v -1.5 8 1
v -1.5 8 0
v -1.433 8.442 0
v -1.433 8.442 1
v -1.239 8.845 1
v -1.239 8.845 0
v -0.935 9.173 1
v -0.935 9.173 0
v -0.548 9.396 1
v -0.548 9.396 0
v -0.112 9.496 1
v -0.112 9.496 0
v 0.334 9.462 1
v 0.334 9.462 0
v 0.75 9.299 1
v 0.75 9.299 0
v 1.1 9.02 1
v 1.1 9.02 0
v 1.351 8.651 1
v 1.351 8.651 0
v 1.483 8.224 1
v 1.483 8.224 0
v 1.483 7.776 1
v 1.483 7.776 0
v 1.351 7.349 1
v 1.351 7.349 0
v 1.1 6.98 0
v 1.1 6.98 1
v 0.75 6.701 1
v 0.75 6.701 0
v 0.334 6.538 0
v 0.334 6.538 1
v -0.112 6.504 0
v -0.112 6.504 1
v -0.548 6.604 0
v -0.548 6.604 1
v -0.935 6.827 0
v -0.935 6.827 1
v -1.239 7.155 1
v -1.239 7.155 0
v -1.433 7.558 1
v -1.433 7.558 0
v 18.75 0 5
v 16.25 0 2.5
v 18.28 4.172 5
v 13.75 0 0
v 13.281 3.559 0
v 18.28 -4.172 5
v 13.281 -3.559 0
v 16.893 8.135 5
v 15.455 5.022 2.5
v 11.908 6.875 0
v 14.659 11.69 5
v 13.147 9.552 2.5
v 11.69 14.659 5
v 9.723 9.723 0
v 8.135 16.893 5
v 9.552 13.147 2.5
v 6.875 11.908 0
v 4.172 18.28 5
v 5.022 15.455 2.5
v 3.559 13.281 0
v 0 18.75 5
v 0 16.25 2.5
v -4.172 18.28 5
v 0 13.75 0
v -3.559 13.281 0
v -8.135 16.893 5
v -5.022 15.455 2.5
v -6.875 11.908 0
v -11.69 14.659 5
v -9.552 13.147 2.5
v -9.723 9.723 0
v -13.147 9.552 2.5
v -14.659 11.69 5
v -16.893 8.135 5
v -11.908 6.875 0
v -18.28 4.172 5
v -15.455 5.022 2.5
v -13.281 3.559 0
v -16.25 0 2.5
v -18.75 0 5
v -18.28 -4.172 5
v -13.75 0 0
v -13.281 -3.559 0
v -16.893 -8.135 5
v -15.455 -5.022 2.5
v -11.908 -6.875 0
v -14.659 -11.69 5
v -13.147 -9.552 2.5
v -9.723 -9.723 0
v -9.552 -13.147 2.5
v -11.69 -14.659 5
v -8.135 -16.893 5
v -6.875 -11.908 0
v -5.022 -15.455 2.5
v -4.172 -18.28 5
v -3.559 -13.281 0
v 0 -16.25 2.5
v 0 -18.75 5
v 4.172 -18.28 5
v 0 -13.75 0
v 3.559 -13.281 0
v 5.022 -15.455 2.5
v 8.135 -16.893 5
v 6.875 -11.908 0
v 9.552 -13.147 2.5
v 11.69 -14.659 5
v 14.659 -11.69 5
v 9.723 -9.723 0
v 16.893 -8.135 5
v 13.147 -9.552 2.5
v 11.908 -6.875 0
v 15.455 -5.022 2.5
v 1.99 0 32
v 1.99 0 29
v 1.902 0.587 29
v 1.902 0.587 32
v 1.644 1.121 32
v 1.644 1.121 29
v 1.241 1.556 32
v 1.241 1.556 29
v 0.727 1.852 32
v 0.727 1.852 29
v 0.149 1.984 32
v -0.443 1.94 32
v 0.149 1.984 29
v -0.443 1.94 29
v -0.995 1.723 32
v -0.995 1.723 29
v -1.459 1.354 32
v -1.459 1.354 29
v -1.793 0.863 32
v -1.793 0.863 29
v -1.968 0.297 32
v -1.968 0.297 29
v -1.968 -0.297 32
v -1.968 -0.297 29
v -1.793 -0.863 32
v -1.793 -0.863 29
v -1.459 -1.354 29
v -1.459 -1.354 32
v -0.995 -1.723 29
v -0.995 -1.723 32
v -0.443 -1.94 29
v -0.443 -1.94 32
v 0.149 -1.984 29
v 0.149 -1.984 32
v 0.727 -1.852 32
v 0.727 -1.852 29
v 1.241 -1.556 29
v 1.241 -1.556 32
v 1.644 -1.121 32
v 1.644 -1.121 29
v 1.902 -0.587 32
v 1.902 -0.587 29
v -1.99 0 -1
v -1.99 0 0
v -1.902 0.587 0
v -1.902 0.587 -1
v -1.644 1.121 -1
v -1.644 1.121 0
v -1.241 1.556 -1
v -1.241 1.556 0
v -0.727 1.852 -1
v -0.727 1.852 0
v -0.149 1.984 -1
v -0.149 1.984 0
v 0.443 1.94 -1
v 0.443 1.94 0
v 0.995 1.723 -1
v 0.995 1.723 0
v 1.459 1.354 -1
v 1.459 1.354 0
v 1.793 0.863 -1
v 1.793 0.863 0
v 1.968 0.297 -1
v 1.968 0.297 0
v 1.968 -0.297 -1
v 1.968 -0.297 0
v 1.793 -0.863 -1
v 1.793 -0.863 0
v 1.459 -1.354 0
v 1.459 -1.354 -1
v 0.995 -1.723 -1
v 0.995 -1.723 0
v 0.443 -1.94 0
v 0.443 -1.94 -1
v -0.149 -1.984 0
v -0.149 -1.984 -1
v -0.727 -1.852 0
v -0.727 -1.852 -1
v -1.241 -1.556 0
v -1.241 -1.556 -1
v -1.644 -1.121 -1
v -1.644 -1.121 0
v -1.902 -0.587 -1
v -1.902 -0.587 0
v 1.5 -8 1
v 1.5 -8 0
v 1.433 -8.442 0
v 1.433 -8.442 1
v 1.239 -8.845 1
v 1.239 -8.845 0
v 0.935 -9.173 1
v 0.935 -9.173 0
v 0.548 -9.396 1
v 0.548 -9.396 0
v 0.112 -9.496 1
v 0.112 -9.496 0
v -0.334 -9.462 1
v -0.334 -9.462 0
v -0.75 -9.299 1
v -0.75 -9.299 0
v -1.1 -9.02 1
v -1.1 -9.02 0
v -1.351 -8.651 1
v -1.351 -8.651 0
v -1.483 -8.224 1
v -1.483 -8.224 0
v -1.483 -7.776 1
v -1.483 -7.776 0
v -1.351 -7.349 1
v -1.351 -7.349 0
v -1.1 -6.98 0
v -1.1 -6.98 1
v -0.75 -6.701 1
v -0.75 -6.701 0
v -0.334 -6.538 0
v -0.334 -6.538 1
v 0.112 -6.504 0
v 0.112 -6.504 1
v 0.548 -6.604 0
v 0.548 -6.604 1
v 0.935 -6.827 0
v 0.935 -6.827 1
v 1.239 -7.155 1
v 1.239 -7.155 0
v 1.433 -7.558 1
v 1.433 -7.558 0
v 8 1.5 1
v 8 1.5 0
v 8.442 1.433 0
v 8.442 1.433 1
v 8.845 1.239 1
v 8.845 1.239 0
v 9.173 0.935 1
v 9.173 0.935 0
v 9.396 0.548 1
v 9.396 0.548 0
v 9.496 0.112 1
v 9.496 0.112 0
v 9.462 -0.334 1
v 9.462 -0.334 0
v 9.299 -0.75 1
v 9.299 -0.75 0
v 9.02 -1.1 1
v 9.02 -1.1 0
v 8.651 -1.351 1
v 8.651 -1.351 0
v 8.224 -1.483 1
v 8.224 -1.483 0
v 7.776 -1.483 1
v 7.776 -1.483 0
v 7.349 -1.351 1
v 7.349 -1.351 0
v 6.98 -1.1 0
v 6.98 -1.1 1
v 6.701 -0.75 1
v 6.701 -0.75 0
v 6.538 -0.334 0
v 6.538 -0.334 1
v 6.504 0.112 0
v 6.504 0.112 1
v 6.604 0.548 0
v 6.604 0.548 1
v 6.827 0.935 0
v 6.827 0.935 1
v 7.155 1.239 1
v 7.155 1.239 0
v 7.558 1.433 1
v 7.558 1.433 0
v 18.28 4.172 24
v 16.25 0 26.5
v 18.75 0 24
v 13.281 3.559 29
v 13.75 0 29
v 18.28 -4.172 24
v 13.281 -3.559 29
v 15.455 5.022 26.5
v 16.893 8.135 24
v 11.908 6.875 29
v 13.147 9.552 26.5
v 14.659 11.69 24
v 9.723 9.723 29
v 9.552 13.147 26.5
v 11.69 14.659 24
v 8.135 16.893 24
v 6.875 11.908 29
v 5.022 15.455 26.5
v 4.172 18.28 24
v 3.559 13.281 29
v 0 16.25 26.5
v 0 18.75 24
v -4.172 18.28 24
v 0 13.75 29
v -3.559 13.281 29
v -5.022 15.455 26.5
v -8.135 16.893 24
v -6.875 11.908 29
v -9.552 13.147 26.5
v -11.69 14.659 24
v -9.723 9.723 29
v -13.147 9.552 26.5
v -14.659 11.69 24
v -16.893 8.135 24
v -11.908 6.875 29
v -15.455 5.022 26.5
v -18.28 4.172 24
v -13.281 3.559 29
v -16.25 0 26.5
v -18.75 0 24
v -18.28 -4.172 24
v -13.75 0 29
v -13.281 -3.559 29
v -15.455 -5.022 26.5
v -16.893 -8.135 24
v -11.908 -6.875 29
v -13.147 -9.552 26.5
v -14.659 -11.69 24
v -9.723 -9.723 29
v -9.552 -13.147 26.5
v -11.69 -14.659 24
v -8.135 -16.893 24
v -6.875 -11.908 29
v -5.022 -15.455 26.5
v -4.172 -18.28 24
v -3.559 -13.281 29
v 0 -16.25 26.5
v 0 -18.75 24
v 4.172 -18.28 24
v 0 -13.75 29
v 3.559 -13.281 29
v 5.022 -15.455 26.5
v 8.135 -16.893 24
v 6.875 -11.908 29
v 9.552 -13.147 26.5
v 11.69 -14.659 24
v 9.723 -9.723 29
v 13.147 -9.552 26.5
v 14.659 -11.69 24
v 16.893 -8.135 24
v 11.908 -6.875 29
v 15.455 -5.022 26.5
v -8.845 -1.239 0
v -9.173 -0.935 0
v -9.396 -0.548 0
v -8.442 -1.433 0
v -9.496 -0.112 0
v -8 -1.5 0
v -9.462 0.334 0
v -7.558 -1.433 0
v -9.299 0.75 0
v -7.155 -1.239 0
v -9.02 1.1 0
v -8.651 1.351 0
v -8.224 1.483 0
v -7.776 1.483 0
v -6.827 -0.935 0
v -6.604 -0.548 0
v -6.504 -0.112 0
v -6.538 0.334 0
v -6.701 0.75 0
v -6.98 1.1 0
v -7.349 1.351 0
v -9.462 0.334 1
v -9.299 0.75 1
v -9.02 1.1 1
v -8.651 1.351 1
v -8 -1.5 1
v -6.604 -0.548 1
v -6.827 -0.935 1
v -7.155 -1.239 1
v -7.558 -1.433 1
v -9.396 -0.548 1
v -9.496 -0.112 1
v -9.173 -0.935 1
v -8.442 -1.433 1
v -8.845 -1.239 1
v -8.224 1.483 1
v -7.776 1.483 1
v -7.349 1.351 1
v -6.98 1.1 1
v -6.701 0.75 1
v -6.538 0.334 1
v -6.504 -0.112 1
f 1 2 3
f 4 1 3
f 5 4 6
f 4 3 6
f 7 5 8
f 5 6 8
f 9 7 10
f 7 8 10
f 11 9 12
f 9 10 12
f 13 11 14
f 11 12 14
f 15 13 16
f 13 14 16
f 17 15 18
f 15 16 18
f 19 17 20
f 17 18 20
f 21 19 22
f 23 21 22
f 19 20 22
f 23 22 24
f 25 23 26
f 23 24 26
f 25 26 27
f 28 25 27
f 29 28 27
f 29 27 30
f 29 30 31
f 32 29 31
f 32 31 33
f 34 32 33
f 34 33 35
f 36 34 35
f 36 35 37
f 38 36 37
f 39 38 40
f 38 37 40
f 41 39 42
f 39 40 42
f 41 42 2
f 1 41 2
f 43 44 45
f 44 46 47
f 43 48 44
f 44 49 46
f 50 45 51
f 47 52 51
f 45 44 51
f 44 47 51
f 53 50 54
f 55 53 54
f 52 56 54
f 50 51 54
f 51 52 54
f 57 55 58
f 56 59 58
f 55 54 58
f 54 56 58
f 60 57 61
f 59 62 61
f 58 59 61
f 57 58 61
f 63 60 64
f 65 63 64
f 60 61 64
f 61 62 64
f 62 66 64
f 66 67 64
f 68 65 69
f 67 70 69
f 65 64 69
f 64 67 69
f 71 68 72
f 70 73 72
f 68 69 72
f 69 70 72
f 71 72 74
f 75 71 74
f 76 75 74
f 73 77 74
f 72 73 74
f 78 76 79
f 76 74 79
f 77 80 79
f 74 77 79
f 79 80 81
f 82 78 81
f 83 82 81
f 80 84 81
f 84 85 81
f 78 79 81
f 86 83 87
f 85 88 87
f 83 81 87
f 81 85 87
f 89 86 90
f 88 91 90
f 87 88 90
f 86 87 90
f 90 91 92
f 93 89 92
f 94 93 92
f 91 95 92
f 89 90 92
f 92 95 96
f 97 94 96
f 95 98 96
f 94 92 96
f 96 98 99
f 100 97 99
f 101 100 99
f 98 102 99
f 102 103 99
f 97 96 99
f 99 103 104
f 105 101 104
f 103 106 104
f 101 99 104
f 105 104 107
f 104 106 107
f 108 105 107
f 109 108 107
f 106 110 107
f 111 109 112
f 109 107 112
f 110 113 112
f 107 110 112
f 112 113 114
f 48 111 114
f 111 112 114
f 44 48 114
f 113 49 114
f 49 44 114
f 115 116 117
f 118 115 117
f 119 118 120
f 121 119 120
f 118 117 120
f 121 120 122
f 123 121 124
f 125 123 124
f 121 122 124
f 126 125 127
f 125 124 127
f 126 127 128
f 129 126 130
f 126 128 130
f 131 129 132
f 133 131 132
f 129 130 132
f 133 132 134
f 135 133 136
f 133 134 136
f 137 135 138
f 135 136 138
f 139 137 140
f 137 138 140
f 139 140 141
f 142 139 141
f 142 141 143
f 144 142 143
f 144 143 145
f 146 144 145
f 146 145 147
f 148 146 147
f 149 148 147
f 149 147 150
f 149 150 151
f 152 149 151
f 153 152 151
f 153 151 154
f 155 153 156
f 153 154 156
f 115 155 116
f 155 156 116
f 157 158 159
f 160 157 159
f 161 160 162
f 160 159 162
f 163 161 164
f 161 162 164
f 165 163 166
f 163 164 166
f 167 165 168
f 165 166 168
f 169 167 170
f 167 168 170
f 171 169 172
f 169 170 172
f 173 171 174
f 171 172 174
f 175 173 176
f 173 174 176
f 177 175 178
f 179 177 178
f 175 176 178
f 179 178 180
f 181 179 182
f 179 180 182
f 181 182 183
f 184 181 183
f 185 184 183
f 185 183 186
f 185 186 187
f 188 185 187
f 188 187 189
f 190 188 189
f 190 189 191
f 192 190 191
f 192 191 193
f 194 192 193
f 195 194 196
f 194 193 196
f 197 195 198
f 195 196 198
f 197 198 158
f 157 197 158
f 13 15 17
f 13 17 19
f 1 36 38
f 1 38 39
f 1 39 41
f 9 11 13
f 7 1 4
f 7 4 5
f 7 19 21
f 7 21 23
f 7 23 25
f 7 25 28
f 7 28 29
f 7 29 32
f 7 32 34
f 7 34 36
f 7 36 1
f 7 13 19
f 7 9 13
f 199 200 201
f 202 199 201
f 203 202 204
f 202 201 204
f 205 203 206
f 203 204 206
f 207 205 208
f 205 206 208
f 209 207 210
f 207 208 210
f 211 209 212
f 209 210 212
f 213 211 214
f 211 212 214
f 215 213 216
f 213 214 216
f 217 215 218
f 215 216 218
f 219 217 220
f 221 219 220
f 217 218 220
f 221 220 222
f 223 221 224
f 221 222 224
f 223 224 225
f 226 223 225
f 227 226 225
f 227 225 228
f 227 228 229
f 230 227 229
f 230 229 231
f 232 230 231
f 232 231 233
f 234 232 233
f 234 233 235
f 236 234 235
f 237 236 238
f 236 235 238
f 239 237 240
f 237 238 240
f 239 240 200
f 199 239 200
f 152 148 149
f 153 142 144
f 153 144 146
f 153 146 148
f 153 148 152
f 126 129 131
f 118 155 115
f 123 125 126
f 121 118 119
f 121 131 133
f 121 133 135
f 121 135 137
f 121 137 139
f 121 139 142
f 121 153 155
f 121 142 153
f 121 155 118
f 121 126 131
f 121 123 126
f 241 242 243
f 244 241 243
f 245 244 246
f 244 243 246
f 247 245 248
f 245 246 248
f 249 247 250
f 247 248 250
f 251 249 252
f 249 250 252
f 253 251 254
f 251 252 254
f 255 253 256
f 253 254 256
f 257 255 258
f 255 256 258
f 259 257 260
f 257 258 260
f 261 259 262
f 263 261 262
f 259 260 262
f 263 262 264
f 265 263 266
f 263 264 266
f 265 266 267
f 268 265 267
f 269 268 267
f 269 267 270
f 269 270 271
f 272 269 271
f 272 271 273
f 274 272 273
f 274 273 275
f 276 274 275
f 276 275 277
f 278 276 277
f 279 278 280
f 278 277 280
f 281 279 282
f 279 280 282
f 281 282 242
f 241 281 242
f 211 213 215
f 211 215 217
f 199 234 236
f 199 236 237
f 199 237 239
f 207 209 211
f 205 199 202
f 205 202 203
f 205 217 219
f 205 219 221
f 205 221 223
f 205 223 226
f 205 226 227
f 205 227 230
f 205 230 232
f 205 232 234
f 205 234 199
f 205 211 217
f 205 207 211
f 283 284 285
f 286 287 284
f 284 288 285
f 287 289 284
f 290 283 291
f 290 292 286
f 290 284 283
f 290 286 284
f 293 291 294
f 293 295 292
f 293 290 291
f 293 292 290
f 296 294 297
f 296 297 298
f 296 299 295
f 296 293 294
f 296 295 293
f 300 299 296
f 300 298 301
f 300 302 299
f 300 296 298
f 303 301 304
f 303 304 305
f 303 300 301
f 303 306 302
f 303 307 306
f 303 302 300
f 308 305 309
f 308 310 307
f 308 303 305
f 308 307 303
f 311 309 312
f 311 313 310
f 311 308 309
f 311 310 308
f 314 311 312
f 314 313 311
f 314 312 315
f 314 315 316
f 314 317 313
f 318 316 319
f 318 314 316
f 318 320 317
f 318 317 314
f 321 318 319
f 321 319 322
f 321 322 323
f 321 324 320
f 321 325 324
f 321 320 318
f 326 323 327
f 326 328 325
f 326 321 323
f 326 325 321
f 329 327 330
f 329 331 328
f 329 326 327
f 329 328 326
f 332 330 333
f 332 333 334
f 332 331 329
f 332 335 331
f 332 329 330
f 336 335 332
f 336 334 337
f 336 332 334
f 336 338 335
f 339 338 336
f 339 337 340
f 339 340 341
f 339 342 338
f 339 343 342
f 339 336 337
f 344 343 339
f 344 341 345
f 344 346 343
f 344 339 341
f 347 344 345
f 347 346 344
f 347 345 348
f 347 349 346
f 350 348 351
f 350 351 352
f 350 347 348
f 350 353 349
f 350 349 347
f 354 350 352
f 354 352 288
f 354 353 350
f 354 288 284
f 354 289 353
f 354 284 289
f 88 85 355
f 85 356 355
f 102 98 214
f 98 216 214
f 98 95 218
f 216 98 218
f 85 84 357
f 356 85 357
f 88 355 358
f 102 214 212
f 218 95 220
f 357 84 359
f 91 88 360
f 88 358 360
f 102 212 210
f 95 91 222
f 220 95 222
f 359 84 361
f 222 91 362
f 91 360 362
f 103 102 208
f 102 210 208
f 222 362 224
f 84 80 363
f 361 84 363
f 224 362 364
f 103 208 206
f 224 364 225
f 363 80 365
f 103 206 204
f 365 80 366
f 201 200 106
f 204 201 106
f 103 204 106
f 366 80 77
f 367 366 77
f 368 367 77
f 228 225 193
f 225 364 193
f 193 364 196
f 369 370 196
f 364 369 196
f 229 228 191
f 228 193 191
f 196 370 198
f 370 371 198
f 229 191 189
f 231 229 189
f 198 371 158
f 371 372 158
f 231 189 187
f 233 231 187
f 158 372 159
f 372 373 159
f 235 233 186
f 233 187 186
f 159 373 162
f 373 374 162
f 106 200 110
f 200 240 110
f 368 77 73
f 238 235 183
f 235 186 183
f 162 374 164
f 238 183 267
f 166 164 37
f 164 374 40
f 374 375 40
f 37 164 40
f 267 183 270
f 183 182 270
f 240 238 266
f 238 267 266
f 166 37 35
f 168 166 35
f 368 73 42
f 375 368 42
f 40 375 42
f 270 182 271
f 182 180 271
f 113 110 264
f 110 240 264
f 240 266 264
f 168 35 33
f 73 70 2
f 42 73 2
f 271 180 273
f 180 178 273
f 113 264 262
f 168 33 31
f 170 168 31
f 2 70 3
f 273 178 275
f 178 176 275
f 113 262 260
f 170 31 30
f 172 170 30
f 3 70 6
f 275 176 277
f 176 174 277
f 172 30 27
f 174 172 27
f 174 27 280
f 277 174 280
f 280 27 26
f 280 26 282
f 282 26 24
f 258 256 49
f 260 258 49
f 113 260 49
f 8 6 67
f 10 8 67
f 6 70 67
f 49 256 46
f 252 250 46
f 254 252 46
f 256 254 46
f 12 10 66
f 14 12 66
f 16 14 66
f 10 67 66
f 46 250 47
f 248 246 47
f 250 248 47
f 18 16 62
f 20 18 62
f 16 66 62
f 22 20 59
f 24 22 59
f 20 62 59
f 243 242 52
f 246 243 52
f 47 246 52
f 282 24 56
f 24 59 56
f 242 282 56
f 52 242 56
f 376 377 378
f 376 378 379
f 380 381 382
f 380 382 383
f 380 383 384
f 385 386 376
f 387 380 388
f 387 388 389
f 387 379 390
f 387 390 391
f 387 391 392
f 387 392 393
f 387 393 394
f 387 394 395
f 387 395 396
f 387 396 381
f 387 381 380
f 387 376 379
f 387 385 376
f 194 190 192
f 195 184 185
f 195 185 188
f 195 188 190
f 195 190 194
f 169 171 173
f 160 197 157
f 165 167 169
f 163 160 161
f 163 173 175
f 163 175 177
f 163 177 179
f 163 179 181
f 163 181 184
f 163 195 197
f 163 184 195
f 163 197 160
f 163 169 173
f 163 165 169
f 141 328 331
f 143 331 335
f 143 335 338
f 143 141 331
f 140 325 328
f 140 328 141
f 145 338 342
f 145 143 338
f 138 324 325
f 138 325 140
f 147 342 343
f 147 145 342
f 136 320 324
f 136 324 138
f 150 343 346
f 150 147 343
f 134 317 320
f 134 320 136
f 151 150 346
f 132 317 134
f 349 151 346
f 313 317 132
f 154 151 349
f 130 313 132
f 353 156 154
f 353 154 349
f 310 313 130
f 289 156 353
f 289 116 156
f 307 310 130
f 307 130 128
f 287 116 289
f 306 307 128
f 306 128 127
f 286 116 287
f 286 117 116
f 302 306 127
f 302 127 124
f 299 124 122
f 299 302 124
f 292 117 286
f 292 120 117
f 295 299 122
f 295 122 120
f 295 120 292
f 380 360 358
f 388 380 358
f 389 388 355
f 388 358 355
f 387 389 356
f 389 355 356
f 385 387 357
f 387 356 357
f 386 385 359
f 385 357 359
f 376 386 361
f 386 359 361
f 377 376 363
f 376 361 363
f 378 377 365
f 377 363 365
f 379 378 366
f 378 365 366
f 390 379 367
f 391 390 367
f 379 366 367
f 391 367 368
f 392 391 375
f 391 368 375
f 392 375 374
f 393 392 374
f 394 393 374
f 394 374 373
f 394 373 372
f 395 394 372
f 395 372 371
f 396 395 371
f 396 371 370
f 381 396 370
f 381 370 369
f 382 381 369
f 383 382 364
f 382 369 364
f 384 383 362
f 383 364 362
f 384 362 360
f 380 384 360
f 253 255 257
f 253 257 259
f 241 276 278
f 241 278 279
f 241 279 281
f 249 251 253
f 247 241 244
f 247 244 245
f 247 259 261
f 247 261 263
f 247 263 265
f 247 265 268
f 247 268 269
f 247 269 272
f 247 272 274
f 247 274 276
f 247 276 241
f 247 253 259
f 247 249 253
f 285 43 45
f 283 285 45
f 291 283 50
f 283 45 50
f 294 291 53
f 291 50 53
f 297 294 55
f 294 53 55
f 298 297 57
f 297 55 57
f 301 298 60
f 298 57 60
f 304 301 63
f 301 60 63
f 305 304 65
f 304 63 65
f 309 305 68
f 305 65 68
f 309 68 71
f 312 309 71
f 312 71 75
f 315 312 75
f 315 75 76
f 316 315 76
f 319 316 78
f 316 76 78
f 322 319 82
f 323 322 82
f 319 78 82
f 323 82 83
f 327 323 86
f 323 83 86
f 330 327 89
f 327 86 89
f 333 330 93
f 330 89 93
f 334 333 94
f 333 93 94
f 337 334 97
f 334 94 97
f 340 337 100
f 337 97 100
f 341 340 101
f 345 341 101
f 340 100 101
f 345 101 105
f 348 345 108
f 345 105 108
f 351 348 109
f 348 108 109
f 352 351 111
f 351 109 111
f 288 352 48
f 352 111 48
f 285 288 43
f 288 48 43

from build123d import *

# Parameters (mm, degrees)
SKETCH1_R           = 18.75
BOSS_EXTRUDE1_DEPTH = 29
SKETCH3_R           = 1.99
BOSS_EXTRUDE4_DEPTH = 3
CHAMFER1_SIZE       = 5
SKETCH4_R           = 1.99
BOSS_EXTRUDE5_DEPTH = 1
SKETCH5_R           = 1.5
CUT_EXTRUDE1_DEPTH  = 1
CIRPATTERN1_COUNT   = 4


with BuildPart() as part:
    # Sketch1 → Boss-Extrude1 (new body)
    with BuildSketch(Plane.XY):
        Circle(SKETCH1_R)
    extrude(amount=BOSS_EXTRUDE1_DEPTH)

    # Sketch3 → Boss-Extrude4 (add)
    with BuildSketch(Plane.XY.offset(29)):
        Circle(SKETCH3_R)
    extrude(amount=BOSS_EXTRUDE4_DEPTH)

    # Chamfer1
    chamfer1_edges = [part.edges().sort_by_distance(p)[0] for p in [
        (-18.75, 0, 0),
        (-18.75, 0, 29),
    ]]
    chamfer(chamfer1_edges, length=CHAMFER1_SIZE)

    # Sketch4 → Boss-Extrude5 (add)
    with BuildSketch(Plane(origin=(0, 0, 0), x_dir=(-1, 0, 0), z_dir=(0, 0, -1))):
        Circle(SKETCH4_R)
    extrude(amount=BOSS_EXTRUDE5_DEPTH)

    # Sketch5 → Cut-Extrude1 (cut)
    with BuildSketch(Plane(origin=(0, 0, 0), x_dir=(-1, 0, 0), z_dir=(0, 0, -1))):
        with Locations((0, 8)):
            Circle(SKETCH5_R)
    cut_extrude1 = extrude(amount=-CUT_EXTRUDE1_DEPTH, mode=Mode.SUBTRACT)

    # CirPattern1: Cut-Extrude1 ×4 about axis
    cirpattern1_axis = Axis((0, 0, 0), (0, 0, 1))
    for i in range(1, CIRPATTERN1_COUNT):
        add(cut_extrude1.rotate(cirpattern1_axis, i * 360 / CIRPATTERN1_COUNT), mode=Mode.SUBTRACT)


solid = part.part
